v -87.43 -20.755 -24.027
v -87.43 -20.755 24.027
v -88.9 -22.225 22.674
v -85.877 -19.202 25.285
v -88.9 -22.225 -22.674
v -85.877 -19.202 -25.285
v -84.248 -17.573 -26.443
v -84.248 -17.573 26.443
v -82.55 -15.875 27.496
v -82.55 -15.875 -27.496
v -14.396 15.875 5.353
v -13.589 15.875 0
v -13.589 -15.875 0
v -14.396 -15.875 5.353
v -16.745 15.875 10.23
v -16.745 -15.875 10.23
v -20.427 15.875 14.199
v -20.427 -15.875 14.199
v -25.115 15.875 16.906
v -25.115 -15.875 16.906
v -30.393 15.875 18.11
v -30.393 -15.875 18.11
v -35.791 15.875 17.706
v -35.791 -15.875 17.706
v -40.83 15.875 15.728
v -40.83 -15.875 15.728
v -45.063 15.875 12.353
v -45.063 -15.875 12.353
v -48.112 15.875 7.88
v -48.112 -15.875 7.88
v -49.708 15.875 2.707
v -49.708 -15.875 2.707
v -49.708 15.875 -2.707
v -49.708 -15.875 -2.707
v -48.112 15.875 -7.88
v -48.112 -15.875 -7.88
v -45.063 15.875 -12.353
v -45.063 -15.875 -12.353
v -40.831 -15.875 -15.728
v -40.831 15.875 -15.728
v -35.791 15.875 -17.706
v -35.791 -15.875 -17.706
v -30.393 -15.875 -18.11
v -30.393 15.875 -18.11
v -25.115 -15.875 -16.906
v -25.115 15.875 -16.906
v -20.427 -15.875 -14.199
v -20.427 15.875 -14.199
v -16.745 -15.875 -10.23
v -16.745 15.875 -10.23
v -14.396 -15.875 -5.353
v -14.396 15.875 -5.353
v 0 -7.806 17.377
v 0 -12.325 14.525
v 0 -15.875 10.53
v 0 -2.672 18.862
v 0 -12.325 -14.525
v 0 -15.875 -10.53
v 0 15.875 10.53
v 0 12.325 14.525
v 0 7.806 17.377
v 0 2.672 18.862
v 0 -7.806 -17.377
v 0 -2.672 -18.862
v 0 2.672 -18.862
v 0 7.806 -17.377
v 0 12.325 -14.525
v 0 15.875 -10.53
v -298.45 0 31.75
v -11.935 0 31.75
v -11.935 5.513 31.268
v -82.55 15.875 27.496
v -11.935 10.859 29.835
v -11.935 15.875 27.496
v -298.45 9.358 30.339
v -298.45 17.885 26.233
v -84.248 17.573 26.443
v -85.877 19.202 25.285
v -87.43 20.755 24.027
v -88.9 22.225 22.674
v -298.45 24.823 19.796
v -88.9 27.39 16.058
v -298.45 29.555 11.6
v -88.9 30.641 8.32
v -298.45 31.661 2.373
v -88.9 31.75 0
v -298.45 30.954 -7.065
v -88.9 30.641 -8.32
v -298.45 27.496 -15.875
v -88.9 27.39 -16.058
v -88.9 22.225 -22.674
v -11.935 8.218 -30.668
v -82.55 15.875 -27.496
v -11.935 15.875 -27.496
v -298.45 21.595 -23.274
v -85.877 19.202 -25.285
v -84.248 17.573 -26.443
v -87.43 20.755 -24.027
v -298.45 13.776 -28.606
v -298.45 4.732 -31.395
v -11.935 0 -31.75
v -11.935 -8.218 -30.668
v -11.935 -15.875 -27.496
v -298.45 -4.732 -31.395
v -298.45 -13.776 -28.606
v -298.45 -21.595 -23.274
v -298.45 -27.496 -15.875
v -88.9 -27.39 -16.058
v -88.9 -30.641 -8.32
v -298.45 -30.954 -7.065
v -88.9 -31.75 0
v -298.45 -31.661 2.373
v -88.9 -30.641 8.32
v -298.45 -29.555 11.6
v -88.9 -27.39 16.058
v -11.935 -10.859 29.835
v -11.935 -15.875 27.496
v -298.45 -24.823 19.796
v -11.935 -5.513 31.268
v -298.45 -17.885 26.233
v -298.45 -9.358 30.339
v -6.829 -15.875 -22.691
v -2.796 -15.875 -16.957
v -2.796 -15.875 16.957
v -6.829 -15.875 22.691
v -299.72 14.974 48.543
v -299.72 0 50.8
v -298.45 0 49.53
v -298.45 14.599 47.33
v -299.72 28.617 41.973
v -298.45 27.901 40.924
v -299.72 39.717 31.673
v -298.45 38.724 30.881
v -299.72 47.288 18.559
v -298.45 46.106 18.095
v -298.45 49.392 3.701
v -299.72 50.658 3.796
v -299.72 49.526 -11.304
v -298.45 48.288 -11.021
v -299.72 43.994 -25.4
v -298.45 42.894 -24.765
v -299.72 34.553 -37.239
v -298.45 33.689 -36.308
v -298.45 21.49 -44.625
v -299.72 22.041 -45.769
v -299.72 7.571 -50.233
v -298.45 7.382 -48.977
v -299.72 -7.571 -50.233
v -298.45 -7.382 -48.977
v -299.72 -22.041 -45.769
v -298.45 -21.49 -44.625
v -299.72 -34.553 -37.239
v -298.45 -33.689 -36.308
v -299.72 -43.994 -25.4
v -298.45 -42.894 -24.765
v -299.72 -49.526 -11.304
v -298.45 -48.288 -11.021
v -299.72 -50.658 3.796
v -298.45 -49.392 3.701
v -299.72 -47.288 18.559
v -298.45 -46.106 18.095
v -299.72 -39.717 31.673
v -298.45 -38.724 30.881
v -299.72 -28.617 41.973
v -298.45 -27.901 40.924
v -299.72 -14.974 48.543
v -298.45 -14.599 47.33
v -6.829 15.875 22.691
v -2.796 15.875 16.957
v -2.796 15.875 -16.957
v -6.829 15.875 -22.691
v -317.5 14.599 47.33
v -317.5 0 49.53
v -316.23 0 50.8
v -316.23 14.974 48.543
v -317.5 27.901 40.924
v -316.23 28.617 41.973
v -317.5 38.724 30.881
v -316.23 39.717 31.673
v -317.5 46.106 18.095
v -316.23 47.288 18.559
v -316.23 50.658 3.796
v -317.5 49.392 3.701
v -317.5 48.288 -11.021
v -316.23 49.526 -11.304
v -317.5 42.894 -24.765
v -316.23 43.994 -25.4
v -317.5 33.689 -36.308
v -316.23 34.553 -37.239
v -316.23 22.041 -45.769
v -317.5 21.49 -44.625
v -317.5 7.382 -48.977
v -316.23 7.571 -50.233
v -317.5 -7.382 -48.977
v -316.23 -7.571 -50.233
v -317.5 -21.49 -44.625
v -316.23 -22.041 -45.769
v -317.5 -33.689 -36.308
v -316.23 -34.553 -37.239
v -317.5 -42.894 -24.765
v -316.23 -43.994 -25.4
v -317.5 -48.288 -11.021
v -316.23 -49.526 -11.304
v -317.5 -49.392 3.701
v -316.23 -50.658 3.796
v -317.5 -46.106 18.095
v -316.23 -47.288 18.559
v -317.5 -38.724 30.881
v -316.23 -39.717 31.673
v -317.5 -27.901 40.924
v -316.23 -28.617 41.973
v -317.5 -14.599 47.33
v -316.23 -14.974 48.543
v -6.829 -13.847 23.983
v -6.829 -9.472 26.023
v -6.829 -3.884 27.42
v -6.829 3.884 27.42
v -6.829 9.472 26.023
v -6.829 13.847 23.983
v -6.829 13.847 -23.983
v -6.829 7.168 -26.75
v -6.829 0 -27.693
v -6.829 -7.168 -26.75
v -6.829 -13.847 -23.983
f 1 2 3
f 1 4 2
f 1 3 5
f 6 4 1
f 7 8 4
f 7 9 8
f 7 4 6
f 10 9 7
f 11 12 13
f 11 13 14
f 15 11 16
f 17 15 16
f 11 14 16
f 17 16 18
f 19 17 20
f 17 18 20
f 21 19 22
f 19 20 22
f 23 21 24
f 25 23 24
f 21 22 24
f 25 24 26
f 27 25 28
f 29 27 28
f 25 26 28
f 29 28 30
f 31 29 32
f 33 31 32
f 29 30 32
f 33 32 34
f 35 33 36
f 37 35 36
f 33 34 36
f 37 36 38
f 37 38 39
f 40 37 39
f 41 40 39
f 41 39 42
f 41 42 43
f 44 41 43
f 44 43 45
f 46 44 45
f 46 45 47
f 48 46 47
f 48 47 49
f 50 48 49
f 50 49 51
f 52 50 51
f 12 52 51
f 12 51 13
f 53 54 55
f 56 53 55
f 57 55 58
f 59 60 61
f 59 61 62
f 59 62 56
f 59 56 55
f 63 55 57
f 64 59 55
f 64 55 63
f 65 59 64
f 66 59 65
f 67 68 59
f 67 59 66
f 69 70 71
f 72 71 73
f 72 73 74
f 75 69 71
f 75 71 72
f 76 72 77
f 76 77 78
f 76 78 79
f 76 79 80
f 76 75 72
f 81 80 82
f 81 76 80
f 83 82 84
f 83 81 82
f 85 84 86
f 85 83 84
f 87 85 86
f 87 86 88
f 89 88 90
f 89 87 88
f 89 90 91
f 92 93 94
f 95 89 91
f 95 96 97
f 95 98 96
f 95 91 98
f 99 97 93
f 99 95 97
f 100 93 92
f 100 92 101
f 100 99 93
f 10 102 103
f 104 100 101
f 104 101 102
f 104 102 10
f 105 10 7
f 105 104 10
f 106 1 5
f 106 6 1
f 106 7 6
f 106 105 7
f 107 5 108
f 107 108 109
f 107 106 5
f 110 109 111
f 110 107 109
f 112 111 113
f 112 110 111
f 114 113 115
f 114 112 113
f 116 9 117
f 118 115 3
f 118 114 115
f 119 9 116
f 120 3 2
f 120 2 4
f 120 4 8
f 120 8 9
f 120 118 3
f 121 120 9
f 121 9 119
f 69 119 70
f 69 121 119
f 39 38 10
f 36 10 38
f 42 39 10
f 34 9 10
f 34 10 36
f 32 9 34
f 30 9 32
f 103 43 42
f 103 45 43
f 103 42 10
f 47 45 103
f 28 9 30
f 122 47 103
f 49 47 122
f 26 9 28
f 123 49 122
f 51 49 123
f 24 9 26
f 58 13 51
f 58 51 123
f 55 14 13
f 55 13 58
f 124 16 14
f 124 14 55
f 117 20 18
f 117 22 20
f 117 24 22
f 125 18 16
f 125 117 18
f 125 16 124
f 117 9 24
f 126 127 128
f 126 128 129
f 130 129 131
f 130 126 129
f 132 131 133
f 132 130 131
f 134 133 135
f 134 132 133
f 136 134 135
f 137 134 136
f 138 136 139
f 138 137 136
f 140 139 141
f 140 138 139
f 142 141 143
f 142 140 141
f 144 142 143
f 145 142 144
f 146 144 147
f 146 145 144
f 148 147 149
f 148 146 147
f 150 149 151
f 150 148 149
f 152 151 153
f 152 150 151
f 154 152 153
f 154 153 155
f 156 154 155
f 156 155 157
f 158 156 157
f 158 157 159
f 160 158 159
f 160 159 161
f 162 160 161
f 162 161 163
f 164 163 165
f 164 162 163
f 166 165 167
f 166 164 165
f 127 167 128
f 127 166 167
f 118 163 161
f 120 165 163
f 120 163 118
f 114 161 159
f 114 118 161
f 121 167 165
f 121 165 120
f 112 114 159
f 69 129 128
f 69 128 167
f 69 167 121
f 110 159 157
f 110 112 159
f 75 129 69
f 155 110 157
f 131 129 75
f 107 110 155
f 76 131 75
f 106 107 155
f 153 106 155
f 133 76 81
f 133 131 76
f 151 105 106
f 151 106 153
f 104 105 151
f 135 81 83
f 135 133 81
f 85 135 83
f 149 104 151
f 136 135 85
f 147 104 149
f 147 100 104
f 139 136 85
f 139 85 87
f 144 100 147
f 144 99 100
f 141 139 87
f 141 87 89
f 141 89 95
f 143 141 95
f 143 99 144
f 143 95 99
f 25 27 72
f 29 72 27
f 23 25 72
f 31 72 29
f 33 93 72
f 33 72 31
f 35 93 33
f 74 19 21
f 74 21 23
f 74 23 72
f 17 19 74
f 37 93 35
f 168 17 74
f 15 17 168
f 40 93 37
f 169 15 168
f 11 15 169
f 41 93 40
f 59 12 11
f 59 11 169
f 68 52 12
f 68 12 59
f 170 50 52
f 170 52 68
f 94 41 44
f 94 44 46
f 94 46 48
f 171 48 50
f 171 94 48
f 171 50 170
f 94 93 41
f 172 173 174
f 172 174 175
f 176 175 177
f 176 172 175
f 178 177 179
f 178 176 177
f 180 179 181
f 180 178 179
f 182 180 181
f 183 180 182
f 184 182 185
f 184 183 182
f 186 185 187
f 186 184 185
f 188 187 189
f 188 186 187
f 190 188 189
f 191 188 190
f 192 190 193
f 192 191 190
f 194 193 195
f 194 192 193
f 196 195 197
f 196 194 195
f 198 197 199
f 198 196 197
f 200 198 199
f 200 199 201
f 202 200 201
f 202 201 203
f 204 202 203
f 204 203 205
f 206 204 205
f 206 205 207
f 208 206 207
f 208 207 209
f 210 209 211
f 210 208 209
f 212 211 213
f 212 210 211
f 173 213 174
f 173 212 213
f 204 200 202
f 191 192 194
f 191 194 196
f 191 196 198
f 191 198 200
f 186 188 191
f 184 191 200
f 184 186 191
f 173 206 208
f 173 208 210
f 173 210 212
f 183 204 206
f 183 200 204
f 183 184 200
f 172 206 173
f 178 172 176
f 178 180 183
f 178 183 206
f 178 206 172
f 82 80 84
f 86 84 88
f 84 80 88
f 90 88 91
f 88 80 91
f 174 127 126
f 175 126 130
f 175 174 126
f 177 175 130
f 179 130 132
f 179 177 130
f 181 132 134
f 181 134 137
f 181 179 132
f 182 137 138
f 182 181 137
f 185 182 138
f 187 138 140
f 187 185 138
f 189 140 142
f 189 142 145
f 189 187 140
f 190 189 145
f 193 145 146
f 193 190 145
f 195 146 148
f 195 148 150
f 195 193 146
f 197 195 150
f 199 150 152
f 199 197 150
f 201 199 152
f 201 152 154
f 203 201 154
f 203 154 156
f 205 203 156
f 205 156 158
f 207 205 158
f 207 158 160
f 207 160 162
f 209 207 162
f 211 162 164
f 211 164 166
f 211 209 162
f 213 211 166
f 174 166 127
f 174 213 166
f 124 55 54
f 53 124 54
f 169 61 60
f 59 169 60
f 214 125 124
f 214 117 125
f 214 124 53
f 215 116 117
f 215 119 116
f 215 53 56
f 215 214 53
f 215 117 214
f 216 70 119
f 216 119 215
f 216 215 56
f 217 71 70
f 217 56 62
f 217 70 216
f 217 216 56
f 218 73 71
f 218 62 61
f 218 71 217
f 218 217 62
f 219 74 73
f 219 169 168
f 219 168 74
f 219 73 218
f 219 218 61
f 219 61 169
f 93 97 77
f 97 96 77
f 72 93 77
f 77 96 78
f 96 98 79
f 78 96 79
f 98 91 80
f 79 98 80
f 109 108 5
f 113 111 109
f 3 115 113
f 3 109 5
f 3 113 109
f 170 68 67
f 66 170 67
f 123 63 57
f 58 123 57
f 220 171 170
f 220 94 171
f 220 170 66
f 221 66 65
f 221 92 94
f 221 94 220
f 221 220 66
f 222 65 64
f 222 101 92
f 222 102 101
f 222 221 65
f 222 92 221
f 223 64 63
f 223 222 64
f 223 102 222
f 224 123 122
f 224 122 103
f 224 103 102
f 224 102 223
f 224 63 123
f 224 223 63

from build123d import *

# Parameters (mm, degrees)
F2_W     = 88.9
F2_H     = 15.875
F3_DEPTH = 31.75
F4_SIZE  = 6.35
F5_R     = 18.161
F6_DEPTH = 66.676
F7_SIZE  = 1.27


with BuildPart() as f1:
    # F0 (on Front) → F1 (revolve)
    with BuildSketch(Plane.XZ):
        with BuildLine():
            Line((-317.5, 0), (0, 0))
            Line((0, 0), (0, 19.05))
            ThreePointArc((0, 19.05), (-5.231581, 26.09159), (-11.935, 31.75))
            Line((-11.935, 31.75), (-298.45, 31.75))
            Line((-298.45, 31.75), (-298.45, 50.8))
            Line((-298.45, 50.8), (-317.5, 50.8))
            Line((-317.5, 50.8), (-317.5, 0))
        make_face()
    revolve(axis=Axis((-156.483173, 0, 0), (-1, 0, 0)))

    # F2 (on Top) → F3 (cut, symmetric)
    with BuildSketch(Plane.XY):
        with Locations((-44.45, 23.8125)):
            Rectangle(F2_W, F2_H)
        with Locations((-44.45, -23.8125)):
            Rectangle(F2_W, F2_H)
    extrude(amount=F3_DEPTH, both=True, mode=Mode.SUBTRACT)

    # F4
    f4_edges = [f1.edges().sort_by_distance(p)[0] for p in [
        (-88.9, -15.875, 0),
        (-88.9, 15.875, 0),
    ]]
    chamfer(f4_edges, length=F4_SIZE)

    # F5 (on face) → F6 (cut, through all)
    with BuildSketch(Plane.XZ.offset(15.875)):
        with Locations((-31.75, 0)):
            Circle(F5_R)
    extrude(amount=-F6_DEPTH, mode=Mode.SUBTRACT)

    # F7
    f7_edges = [f1.edges().sort_by_distance(p)[0] for p in [
        (-298.45, 0, -50.8),
        (-317.5, 0, -50.8),
    ]]
    chamfer(f7_edges, length=F7_SIZE)


solid = f1.part
